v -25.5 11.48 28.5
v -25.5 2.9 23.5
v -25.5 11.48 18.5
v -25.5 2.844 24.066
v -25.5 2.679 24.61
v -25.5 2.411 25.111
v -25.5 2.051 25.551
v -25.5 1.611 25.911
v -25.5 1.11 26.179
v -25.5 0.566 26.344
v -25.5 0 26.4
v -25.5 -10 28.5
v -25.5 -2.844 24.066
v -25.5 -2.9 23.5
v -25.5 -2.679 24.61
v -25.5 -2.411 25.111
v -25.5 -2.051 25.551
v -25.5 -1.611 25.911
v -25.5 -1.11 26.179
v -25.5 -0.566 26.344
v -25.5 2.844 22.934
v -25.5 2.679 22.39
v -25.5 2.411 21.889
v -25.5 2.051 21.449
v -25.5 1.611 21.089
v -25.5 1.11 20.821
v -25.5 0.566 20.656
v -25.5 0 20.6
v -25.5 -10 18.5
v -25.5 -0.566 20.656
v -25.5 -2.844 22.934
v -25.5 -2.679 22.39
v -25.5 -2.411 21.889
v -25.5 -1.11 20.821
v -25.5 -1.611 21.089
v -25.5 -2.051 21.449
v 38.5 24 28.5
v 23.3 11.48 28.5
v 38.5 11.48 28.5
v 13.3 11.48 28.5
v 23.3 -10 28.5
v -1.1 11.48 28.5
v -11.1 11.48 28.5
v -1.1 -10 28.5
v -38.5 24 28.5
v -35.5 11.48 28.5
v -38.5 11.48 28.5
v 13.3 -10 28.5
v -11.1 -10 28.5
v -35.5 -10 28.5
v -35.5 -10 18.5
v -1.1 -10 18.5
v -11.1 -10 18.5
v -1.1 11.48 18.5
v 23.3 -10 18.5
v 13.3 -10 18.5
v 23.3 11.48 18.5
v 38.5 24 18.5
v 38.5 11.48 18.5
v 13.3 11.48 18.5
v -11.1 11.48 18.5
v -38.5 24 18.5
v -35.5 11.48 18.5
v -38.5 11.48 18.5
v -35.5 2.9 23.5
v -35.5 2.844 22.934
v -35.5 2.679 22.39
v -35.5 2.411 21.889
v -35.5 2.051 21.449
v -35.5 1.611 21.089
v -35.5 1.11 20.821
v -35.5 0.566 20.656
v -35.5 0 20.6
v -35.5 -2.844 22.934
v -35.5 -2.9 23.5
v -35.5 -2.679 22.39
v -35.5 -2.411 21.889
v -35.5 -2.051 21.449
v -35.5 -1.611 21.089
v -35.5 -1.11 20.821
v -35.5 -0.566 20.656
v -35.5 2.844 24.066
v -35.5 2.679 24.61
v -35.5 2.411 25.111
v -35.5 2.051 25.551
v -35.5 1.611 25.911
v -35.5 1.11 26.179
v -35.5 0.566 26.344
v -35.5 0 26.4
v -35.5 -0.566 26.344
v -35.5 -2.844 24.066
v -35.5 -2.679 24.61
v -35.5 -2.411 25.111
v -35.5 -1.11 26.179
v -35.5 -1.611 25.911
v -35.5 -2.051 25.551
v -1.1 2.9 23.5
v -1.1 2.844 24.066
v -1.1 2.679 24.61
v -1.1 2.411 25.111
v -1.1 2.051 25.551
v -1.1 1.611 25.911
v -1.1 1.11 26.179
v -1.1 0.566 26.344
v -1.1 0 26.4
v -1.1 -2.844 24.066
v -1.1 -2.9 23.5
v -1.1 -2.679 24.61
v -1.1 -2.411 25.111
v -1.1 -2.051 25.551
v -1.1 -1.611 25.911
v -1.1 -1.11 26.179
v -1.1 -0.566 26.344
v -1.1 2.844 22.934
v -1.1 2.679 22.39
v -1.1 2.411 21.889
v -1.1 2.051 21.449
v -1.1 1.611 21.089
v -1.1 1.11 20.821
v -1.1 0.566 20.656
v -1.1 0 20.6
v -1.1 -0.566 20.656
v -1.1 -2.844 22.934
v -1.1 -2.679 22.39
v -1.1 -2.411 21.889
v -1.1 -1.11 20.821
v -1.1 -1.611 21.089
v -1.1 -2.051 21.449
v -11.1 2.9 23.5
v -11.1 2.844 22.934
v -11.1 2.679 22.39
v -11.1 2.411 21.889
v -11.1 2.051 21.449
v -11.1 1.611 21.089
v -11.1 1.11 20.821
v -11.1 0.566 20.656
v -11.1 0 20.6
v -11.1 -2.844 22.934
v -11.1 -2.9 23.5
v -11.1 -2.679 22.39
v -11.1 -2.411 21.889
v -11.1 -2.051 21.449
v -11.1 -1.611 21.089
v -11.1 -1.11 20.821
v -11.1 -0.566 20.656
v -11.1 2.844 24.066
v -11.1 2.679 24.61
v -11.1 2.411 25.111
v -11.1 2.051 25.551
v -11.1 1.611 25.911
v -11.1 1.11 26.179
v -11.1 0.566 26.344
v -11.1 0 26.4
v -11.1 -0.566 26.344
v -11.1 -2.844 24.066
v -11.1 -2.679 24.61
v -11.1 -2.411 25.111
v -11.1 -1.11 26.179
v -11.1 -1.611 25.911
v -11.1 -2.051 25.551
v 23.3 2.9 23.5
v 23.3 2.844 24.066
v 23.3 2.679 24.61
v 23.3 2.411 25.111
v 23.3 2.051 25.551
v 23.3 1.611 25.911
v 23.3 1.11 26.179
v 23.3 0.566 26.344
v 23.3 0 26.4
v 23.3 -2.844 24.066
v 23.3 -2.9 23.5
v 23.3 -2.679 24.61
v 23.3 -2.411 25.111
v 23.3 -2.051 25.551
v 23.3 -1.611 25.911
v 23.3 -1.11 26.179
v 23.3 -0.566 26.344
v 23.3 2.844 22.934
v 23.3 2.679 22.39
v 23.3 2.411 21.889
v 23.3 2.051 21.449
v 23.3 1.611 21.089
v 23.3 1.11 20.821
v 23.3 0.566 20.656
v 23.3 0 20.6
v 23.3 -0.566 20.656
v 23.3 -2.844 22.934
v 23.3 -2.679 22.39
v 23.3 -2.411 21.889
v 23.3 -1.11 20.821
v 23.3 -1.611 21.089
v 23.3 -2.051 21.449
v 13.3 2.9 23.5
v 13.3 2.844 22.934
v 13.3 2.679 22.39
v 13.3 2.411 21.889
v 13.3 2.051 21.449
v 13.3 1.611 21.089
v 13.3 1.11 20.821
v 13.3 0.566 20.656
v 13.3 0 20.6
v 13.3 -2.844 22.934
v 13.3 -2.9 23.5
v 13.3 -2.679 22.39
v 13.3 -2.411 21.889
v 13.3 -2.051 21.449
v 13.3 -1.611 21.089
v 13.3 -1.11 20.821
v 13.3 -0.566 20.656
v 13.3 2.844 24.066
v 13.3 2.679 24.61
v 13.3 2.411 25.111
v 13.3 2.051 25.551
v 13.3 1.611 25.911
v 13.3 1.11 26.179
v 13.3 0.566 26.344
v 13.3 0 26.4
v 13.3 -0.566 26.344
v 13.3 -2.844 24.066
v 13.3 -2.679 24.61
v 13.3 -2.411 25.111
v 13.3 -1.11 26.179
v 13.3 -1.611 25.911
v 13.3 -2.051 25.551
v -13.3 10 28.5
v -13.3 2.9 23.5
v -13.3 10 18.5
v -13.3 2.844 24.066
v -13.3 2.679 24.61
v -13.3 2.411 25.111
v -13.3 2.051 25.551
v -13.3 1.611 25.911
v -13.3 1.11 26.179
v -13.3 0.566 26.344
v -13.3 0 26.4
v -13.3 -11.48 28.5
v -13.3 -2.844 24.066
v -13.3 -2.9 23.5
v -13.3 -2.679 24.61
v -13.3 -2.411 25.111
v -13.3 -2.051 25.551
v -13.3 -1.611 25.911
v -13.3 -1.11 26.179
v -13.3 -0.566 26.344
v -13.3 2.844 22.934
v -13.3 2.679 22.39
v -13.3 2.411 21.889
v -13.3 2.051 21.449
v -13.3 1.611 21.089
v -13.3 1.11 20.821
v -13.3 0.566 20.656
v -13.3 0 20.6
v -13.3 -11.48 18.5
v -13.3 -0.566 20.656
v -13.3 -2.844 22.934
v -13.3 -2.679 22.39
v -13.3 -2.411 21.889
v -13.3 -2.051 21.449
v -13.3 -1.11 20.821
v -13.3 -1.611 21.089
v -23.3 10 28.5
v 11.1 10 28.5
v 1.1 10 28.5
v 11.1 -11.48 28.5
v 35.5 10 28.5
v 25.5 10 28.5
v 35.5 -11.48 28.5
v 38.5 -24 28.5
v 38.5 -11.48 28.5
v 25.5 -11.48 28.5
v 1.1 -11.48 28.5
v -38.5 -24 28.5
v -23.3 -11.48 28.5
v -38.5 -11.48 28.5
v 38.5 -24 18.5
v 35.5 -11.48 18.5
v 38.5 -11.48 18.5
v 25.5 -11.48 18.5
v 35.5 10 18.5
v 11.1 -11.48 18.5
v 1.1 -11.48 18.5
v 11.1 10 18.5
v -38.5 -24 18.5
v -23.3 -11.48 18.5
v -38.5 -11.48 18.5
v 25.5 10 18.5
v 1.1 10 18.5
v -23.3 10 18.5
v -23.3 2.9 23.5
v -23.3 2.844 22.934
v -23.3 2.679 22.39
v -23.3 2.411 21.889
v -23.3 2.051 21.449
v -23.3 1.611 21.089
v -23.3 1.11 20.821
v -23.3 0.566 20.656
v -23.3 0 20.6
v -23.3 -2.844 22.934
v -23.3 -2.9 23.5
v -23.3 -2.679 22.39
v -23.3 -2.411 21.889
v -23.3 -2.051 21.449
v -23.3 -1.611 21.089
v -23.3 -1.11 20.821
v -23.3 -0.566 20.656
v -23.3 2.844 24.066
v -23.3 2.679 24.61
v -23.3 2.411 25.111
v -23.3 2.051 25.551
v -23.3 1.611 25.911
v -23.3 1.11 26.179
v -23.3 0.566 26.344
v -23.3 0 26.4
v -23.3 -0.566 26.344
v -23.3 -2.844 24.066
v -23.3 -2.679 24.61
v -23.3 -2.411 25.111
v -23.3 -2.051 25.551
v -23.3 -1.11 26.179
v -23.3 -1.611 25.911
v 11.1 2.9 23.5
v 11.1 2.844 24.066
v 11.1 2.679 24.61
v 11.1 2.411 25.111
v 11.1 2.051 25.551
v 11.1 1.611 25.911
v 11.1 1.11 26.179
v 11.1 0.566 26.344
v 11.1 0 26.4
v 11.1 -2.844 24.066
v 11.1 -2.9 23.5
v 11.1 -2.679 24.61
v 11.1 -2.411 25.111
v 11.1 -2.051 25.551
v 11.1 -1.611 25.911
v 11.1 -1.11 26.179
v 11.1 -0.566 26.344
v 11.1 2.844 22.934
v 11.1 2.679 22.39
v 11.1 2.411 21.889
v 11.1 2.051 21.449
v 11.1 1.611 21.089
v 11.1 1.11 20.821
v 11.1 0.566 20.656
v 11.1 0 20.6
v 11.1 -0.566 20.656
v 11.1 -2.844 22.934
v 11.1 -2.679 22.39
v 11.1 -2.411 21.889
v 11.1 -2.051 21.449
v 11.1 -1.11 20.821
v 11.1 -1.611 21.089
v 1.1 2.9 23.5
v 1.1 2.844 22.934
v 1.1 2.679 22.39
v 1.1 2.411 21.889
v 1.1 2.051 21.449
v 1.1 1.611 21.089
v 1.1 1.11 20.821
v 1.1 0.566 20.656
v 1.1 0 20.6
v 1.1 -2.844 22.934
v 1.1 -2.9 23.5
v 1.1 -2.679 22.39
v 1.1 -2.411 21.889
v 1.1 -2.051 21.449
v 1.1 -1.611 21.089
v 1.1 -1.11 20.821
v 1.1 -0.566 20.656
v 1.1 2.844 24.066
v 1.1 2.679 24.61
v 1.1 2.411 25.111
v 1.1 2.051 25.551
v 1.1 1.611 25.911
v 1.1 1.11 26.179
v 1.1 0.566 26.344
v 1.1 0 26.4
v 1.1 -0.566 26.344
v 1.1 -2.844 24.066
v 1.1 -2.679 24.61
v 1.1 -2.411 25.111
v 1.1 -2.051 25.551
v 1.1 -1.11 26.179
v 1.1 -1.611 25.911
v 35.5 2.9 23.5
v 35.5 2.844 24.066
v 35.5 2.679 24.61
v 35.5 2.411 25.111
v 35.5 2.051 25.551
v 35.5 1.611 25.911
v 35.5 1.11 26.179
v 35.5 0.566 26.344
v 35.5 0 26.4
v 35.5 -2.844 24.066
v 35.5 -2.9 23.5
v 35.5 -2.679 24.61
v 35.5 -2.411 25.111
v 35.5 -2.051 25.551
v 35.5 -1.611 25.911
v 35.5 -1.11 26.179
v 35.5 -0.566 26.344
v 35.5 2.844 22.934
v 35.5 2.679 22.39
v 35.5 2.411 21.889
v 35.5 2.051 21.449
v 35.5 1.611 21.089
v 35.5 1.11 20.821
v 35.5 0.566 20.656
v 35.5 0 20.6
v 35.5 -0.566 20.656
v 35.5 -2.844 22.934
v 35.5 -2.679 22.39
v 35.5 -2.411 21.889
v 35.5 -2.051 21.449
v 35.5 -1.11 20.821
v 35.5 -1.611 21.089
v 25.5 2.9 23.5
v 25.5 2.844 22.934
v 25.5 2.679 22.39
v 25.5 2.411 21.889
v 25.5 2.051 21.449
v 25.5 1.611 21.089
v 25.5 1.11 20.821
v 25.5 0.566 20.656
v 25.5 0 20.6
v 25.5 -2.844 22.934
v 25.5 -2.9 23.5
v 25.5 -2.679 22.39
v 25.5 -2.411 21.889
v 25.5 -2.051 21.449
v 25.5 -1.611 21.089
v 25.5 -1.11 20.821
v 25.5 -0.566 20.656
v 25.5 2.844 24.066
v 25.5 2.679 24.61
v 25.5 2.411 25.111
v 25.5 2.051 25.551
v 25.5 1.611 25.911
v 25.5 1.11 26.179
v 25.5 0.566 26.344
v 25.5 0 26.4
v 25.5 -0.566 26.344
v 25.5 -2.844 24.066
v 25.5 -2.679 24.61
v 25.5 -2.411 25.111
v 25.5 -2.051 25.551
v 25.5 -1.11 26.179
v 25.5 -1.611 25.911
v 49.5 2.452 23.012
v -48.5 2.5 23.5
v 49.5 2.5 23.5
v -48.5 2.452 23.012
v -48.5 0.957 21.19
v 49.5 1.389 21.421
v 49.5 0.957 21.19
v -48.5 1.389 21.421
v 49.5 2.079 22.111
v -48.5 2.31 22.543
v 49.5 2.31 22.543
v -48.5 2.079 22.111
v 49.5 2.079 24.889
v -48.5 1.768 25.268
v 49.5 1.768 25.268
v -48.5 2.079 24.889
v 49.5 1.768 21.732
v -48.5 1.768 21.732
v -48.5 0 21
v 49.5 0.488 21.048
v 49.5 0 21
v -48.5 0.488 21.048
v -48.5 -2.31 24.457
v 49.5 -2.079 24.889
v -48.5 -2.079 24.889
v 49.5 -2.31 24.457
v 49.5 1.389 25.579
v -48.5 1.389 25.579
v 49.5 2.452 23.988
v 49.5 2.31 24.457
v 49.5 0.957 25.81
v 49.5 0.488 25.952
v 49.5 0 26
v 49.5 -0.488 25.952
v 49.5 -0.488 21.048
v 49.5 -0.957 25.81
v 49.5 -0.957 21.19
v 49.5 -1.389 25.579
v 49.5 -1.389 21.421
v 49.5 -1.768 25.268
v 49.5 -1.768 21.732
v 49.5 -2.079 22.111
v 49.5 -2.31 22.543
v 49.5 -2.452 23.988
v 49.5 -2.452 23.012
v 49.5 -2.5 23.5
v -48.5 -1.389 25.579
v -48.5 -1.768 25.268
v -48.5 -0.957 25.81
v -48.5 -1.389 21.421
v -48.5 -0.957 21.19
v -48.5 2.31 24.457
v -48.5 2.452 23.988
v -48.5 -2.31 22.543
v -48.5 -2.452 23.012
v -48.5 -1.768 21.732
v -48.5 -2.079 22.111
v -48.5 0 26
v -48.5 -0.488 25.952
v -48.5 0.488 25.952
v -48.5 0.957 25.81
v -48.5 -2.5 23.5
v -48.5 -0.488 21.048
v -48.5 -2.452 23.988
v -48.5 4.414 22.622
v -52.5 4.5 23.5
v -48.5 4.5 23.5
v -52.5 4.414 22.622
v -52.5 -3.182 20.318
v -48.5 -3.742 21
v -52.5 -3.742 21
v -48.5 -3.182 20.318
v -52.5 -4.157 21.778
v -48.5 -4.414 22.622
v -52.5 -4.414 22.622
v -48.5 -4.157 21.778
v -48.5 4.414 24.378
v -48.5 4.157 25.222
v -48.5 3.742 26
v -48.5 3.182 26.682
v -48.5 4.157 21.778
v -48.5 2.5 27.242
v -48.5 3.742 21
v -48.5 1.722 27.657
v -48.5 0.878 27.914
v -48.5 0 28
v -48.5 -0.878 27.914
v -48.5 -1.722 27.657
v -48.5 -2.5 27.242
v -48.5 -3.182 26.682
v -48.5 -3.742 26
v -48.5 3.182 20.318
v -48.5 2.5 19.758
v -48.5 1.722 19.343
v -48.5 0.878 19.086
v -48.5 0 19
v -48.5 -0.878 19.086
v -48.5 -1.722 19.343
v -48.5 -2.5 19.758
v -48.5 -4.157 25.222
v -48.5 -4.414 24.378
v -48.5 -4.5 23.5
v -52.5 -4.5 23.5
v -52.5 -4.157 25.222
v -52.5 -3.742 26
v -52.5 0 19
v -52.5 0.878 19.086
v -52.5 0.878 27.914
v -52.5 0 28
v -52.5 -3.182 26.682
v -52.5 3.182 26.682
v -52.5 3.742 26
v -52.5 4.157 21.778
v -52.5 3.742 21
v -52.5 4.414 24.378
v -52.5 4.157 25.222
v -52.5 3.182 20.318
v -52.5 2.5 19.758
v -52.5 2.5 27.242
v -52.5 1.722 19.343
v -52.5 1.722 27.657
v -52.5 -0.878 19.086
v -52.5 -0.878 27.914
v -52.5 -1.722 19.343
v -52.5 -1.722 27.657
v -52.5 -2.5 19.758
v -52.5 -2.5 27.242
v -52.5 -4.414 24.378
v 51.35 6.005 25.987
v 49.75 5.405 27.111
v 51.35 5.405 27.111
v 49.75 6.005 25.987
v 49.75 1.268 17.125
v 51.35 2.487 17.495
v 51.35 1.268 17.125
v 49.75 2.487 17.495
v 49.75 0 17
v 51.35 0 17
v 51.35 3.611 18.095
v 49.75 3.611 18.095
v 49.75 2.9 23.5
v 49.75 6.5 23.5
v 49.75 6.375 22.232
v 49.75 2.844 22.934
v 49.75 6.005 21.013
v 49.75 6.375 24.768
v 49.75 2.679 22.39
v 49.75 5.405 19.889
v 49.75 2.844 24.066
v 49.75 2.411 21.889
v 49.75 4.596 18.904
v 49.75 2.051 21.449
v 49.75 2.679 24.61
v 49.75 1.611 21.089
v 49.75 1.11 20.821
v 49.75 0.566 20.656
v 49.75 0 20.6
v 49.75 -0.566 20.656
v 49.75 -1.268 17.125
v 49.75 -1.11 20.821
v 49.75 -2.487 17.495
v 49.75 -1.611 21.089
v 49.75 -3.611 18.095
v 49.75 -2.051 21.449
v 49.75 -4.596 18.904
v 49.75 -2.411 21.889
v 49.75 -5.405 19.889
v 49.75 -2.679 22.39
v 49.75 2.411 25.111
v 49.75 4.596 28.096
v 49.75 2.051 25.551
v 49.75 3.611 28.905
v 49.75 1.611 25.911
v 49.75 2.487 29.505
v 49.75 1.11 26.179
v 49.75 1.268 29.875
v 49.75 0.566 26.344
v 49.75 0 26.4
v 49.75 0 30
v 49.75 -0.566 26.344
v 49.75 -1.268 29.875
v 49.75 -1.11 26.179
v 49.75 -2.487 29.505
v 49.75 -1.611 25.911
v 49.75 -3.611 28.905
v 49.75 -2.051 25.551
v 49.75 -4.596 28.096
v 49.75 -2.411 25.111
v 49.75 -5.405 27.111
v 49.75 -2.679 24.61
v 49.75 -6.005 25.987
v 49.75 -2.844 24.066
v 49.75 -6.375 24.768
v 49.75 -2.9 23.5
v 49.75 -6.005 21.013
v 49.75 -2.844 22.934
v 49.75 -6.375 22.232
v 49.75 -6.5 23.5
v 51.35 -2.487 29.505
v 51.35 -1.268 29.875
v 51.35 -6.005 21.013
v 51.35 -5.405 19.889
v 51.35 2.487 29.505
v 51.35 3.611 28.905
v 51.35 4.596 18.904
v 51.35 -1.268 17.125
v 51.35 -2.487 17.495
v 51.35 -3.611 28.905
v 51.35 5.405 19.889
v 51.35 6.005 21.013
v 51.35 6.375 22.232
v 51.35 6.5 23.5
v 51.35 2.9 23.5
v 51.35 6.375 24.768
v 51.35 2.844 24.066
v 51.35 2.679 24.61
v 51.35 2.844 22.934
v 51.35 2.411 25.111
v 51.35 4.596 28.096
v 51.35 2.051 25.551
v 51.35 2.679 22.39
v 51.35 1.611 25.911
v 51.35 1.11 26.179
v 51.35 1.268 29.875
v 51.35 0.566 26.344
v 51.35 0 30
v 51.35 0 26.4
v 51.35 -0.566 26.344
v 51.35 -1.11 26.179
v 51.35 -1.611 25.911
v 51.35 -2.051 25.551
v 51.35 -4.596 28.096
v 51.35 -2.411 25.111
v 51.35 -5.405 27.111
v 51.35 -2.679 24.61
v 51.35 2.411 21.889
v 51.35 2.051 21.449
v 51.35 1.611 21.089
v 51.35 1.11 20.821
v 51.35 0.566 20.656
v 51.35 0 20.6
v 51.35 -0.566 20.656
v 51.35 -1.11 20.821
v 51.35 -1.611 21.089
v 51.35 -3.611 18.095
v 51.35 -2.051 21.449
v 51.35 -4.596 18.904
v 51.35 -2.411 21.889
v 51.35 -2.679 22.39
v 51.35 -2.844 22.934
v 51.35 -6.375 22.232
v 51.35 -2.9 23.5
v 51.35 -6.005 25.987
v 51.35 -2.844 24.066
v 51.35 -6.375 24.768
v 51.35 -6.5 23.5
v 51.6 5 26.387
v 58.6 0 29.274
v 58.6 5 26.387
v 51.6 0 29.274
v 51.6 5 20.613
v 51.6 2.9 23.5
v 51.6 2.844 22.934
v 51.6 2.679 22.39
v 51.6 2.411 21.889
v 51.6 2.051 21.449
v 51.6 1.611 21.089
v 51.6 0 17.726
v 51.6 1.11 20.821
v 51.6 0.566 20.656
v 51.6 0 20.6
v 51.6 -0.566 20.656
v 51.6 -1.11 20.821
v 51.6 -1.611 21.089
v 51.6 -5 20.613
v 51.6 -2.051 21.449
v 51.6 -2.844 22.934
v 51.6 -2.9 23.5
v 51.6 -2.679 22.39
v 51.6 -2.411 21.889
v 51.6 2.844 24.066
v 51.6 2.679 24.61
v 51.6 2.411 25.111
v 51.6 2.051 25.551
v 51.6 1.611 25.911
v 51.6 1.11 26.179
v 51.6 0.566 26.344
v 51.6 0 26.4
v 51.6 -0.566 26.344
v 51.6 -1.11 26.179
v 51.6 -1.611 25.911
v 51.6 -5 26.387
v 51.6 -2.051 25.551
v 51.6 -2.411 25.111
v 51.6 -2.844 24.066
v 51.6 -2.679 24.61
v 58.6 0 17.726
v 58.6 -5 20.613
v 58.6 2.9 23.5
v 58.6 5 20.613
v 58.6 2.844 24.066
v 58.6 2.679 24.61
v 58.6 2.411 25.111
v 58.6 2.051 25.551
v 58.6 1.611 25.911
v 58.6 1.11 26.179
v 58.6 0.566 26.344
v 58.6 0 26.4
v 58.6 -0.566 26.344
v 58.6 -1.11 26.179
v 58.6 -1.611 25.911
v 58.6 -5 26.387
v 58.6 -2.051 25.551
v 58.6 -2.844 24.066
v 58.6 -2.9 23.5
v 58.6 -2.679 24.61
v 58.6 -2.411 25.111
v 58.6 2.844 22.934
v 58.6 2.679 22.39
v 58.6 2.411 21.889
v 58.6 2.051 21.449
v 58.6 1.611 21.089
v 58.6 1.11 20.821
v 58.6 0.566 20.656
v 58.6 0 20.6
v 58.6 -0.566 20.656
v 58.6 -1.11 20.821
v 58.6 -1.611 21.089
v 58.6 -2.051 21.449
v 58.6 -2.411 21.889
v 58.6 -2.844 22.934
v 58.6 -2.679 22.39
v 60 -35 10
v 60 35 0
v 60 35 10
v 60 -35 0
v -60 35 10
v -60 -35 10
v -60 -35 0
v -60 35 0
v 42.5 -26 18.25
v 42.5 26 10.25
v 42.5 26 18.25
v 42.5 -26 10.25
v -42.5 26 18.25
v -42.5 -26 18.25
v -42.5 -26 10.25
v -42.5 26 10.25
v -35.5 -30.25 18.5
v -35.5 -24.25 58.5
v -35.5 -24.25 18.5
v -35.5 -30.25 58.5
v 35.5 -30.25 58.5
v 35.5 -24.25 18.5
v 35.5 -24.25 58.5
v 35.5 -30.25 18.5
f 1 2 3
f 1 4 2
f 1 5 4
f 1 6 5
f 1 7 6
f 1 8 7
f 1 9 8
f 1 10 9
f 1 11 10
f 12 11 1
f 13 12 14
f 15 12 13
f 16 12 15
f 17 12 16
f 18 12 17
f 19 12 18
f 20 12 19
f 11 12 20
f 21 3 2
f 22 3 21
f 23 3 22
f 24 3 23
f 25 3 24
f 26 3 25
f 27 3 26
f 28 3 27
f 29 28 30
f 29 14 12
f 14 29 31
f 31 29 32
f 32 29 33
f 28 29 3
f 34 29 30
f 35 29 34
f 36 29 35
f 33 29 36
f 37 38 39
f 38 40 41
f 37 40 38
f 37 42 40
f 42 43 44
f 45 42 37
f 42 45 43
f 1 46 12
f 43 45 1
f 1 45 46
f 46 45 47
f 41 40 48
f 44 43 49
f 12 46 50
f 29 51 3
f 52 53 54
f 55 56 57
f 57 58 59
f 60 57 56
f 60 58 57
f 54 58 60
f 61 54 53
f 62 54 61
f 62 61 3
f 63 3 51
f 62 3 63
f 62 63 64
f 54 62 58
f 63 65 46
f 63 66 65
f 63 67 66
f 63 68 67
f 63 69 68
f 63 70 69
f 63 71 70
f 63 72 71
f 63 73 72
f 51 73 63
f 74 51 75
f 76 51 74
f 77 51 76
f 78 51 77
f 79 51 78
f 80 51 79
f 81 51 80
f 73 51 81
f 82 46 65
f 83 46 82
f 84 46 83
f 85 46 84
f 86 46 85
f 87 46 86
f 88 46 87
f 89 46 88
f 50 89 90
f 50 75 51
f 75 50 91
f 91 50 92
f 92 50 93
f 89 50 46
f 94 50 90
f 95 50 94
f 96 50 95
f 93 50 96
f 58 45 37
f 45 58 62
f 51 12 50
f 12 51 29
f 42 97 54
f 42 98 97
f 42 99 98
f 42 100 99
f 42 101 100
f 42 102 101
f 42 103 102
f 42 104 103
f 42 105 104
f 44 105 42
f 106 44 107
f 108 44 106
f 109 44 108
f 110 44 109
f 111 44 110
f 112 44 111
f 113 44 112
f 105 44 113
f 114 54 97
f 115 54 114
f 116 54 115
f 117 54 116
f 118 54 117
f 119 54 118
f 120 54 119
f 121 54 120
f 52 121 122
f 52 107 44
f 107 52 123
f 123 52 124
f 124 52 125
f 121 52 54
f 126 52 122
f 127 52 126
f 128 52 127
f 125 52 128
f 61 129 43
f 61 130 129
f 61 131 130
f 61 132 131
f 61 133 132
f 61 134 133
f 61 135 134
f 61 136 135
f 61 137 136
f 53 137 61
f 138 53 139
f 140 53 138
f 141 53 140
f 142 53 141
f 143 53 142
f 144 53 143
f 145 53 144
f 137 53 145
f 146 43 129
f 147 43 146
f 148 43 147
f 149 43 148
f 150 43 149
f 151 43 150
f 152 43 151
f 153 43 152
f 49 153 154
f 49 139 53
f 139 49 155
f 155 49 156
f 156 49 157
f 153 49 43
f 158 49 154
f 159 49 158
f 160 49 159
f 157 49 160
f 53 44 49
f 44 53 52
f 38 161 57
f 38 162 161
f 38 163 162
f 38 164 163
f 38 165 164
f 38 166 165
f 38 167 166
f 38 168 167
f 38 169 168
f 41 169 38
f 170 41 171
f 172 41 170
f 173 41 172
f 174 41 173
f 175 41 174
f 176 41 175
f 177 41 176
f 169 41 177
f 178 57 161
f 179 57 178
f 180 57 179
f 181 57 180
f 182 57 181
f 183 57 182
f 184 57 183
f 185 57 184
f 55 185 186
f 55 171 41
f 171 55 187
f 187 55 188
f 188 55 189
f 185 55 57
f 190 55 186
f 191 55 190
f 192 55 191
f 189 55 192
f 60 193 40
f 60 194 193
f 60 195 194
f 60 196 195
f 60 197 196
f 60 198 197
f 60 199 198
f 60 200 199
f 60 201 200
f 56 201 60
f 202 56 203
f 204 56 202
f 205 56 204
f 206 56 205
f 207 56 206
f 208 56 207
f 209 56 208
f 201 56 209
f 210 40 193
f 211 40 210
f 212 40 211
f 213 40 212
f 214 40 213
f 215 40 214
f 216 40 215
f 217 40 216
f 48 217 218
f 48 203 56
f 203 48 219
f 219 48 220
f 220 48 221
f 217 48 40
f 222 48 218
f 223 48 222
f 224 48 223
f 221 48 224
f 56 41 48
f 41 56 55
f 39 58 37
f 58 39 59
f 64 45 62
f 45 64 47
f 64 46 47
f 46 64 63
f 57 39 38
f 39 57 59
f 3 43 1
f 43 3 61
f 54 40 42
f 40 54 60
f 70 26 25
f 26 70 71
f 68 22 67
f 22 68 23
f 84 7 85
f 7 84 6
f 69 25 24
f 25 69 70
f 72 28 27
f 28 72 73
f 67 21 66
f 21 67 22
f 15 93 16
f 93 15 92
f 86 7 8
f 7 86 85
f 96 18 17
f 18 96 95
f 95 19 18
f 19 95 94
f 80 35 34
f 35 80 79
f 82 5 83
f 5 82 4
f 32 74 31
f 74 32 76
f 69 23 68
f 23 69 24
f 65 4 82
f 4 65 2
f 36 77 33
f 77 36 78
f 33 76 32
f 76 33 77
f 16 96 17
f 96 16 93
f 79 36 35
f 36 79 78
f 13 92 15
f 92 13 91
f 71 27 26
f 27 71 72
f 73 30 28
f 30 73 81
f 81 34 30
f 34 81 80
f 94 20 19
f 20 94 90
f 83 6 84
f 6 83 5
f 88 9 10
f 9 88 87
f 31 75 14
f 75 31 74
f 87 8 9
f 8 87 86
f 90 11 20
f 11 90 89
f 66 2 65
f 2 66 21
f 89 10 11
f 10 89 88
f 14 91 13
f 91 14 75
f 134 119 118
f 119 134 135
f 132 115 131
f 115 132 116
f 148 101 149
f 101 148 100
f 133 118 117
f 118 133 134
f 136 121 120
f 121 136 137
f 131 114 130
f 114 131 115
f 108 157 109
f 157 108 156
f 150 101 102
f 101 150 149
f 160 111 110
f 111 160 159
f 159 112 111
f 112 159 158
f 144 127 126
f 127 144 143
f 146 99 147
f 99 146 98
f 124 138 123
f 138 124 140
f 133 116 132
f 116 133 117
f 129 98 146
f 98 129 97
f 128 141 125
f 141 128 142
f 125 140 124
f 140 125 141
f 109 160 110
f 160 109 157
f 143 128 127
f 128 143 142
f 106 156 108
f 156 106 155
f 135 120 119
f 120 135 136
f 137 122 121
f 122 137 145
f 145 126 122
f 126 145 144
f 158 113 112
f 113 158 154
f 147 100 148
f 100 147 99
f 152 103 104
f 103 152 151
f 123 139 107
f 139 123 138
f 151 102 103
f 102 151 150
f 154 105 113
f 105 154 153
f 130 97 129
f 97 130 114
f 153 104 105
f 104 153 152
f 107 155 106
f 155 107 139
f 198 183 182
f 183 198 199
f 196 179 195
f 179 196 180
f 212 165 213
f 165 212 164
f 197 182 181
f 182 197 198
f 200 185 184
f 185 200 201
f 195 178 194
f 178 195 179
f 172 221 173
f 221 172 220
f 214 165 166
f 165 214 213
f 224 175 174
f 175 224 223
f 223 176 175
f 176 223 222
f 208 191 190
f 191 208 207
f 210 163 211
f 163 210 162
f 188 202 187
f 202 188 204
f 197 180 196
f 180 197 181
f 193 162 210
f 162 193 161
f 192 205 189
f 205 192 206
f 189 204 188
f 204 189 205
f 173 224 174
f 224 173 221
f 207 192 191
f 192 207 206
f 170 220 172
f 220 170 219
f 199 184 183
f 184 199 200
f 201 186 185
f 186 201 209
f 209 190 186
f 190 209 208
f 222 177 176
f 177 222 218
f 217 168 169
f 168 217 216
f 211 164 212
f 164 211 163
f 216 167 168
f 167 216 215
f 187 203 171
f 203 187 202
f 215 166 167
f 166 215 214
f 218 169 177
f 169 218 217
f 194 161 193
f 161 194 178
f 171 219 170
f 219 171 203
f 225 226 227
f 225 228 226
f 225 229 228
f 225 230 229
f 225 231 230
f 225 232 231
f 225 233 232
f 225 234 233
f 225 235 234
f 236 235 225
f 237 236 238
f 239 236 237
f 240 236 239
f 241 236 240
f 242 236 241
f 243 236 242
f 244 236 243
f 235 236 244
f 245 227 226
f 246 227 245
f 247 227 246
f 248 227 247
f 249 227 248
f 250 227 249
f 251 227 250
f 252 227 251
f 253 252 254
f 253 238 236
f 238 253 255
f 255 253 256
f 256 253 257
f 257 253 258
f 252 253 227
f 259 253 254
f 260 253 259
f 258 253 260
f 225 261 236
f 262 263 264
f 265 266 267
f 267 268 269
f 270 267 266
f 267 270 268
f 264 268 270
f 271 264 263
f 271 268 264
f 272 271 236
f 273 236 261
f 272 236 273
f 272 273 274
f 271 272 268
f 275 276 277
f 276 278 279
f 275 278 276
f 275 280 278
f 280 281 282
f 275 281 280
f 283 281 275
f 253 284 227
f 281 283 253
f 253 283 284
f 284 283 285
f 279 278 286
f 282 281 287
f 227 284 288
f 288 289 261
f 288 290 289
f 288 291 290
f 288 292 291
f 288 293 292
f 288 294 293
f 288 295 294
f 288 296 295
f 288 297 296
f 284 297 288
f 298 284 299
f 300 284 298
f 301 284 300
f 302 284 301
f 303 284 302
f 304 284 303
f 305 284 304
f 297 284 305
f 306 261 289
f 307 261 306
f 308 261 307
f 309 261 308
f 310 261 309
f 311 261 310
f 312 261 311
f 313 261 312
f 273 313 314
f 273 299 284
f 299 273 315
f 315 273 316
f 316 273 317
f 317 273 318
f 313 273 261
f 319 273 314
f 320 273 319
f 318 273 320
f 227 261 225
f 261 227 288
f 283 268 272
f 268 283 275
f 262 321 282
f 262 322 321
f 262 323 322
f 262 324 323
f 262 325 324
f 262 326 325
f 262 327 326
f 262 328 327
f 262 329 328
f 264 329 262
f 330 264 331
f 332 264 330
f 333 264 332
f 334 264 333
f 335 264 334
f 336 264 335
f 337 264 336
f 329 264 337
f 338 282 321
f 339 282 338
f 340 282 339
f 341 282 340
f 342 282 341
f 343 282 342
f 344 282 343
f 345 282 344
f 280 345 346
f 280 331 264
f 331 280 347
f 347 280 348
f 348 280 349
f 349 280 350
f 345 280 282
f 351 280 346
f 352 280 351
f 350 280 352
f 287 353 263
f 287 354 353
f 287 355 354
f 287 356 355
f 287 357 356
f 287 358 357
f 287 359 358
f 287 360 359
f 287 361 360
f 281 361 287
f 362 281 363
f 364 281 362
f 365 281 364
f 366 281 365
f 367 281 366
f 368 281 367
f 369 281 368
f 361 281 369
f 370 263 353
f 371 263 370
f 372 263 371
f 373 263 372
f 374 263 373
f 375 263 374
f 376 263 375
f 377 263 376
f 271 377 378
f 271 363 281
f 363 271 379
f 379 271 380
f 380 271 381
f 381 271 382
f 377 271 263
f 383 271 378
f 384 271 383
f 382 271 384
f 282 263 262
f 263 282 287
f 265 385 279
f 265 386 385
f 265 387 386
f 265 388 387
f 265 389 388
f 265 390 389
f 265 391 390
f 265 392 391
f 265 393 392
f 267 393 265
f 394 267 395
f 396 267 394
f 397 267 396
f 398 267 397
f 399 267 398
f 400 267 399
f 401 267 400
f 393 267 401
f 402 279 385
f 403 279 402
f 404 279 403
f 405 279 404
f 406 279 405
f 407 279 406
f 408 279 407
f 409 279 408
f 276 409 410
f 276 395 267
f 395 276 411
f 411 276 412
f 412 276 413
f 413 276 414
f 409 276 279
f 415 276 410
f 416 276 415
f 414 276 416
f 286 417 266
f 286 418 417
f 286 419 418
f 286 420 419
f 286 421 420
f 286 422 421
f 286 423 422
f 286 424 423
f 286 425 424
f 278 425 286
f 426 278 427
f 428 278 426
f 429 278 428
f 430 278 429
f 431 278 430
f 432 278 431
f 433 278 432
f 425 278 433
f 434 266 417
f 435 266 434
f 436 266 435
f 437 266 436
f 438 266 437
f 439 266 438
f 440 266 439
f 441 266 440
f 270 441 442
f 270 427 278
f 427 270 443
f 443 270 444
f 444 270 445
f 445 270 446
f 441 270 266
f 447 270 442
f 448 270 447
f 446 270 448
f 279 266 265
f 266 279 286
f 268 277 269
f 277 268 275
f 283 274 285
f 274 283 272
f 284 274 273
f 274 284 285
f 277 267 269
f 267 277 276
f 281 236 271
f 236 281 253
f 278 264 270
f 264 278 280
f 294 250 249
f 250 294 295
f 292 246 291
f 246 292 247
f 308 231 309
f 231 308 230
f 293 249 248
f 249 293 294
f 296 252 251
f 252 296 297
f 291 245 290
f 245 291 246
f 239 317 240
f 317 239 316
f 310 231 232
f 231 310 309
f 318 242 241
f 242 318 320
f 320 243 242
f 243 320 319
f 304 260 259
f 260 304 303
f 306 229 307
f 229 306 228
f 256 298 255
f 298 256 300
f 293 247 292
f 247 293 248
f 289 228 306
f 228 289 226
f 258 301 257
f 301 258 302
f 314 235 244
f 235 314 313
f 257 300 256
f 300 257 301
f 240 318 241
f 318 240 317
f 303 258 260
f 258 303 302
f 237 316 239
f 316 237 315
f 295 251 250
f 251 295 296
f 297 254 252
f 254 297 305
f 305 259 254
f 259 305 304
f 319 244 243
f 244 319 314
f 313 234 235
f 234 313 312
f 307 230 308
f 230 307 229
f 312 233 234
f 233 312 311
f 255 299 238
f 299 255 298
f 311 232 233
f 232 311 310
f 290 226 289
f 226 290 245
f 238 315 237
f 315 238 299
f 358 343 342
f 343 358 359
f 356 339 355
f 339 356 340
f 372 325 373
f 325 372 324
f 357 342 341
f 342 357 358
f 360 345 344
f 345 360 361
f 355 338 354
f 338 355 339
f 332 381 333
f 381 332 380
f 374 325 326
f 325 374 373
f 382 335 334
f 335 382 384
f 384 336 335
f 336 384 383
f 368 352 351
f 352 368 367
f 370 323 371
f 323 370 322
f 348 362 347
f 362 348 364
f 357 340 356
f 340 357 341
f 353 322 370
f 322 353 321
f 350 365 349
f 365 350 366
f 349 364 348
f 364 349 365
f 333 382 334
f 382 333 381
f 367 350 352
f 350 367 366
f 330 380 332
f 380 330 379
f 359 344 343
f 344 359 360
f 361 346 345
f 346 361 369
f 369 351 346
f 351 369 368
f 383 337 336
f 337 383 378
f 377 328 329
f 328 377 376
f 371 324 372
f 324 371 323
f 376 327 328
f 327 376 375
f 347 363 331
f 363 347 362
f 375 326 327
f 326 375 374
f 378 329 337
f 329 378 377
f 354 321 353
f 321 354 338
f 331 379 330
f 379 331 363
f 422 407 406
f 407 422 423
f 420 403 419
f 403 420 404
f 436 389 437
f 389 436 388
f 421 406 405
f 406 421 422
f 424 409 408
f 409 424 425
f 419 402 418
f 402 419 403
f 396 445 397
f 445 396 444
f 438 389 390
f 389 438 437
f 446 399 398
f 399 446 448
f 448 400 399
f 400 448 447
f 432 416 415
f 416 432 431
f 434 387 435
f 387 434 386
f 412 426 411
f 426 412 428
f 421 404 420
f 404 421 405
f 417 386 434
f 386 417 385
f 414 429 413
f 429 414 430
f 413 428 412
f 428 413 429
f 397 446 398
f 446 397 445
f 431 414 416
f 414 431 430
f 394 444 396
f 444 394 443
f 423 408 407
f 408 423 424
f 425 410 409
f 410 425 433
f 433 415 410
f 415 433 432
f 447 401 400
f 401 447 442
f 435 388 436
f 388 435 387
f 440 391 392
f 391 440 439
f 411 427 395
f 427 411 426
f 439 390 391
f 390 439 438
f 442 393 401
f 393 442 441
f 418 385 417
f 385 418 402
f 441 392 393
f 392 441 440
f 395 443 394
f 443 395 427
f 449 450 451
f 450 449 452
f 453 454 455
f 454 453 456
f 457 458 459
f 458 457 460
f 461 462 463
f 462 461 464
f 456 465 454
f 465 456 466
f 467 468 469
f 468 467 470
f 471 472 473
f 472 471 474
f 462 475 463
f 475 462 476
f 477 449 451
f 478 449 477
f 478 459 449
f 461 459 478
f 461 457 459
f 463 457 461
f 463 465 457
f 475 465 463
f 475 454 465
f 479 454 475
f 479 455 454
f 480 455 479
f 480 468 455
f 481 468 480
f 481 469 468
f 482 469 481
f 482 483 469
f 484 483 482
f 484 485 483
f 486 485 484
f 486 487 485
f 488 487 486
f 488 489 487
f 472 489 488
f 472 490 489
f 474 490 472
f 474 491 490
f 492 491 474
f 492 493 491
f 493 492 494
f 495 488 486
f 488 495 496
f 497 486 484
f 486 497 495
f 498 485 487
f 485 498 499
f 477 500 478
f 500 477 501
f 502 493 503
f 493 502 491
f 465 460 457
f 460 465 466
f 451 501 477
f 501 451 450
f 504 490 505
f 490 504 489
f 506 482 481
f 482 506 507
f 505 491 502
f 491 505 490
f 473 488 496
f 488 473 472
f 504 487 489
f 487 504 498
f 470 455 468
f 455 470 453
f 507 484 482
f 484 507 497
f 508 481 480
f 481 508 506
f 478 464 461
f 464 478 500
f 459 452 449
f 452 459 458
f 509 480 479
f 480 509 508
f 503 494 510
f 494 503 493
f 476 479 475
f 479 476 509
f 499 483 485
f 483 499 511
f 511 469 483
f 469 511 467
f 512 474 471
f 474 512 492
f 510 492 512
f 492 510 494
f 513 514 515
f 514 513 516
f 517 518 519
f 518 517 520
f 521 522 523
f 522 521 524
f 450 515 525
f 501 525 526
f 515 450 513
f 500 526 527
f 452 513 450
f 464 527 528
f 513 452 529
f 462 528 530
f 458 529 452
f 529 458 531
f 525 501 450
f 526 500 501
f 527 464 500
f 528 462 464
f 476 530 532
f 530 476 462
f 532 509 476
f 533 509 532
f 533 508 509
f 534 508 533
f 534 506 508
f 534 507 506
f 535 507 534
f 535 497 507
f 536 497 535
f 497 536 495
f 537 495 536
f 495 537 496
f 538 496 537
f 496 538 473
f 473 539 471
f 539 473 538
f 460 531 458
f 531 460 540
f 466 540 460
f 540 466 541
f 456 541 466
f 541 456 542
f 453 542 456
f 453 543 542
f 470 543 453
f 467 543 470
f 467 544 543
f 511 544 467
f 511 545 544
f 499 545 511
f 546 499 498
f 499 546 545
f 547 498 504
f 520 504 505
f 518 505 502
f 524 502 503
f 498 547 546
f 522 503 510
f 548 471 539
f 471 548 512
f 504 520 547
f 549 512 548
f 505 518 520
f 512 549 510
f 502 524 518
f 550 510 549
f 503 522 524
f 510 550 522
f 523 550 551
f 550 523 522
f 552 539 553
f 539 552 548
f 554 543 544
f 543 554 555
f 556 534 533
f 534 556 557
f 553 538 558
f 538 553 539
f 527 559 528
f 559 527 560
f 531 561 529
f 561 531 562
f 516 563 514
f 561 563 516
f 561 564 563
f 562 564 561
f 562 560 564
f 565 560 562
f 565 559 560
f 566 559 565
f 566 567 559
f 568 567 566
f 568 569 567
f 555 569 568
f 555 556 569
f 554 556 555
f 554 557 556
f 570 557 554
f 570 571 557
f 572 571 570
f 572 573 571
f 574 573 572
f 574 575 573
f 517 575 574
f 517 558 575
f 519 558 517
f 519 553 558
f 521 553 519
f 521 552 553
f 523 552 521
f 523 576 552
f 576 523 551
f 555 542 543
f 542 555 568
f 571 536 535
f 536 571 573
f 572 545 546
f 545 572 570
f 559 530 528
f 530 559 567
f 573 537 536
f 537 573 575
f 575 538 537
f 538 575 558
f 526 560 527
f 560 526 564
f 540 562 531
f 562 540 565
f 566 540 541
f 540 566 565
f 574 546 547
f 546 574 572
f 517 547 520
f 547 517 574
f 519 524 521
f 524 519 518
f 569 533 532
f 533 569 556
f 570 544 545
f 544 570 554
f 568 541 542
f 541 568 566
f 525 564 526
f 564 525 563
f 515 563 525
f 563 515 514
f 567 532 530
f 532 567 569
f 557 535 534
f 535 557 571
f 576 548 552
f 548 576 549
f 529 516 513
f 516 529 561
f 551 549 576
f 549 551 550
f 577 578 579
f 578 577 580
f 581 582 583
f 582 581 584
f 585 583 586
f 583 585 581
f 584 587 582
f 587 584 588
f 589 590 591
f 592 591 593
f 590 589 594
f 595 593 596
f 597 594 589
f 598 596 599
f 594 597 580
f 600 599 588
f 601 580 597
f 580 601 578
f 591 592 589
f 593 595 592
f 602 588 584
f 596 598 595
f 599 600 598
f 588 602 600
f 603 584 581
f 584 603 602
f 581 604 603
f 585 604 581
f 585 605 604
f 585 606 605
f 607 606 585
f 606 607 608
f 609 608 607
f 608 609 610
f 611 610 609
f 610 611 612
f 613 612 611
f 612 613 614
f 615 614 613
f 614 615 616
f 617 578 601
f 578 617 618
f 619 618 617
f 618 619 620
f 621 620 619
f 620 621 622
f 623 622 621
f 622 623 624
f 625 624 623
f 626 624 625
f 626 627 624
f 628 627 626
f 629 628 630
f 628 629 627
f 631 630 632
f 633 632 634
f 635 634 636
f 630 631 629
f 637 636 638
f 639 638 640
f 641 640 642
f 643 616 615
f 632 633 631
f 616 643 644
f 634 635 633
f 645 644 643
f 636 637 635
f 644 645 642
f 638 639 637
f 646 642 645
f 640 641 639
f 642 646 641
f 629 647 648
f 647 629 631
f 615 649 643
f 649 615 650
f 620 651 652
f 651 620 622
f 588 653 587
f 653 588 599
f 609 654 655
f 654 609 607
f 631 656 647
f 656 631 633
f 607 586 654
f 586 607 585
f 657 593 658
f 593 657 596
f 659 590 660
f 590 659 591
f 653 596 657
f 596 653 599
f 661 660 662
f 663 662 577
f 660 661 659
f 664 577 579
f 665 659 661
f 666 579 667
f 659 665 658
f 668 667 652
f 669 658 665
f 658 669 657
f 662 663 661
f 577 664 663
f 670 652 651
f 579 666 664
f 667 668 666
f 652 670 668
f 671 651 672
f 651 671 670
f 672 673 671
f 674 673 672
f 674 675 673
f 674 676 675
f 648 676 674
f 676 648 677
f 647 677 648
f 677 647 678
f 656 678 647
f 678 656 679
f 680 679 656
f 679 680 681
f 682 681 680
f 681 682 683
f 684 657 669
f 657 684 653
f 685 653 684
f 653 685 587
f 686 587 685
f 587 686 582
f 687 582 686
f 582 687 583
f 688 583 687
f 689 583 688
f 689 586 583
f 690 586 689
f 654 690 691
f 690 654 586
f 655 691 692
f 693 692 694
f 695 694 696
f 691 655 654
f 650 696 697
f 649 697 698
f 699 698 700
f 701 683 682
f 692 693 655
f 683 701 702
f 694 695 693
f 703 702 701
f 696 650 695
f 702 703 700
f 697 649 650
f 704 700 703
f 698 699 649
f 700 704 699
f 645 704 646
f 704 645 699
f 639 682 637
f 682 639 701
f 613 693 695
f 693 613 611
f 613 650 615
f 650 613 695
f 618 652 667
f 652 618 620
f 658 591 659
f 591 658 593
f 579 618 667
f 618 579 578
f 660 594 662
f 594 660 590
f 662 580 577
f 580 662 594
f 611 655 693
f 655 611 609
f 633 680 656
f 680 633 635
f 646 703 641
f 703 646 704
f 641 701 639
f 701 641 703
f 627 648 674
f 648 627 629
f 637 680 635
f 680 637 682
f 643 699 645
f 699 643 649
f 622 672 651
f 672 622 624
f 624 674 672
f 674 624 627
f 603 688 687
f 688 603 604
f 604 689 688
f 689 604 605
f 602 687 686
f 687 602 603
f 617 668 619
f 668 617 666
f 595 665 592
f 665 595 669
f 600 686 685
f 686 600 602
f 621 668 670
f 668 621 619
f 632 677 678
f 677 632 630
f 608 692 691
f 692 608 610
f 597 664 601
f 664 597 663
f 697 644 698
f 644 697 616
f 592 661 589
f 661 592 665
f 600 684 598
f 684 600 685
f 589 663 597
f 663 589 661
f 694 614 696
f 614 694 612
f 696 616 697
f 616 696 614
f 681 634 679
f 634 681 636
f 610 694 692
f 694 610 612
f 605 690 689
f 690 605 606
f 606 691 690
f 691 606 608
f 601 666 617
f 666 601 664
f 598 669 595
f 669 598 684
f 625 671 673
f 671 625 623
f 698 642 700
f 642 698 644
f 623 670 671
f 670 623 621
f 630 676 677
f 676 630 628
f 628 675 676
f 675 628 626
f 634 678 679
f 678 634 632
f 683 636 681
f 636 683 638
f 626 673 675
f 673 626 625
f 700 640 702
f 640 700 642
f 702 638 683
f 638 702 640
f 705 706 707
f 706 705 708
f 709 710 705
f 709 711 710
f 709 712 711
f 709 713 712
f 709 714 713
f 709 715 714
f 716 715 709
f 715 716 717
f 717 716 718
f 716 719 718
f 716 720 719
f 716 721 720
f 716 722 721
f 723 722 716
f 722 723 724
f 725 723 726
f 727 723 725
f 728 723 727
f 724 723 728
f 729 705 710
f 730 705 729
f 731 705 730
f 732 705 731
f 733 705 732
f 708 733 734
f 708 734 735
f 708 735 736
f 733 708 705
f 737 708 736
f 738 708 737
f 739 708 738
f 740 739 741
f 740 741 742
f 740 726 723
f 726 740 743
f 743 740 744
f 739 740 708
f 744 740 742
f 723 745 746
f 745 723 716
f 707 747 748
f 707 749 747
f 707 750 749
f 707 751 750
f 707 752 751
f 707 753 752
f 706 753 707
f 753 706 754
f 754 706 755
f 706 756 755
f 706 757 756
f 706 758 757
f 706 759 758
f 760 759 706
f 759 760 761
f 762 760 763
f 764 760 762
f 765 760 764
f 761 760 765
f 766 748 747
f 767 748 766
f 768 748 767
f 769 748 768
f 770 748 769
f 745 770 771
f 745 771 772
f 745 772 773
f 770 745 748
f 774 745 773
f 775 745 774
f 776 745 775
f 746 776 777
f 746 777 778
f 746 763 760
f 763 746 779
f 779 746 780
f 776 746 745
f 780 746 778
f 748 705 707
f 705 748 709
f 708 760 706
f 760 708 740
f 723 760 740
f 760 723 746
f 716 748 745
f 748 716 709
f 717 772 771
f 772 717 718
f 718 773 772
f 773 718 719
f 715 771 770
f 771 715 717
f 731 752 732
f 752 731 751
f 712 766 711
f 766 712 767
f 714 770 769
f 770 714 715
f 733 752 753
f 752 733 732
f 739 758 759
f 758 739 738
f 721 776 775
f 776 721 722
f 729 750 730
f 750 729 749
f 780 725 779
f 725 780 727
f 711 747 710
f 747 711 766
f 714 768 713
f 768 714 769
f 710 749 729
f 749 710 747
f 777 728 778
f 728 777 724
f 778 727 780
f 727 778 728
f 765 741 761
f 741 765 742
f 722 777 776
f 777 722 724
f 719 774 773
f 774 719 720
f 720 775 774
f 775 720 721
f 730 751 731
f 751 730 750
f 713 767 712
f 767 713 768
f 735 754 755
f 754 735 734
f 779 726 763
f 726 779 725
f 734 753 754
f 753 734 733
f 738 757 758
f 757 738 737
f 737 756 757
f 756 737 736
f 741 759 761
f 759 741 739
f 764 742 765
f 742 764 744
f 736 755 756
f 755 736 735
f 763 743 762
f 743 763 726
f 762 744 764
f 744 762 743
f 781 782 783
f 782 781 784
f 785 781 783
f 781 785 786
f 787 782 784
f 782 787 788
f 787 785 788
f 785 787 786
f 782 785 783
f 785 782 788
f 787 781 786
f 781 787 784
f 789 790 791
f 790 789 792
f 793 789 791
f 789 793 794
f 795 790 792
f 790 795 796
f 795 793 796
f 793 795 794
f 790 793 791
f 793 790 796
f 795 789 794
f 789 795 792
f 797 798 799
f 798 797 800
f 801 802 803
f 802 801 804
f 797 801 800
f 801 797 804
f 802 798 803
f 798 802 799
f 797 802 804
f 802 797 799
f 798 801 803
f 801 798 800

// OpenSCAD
$fn = 32;

// ------------------------------------------------------------------------
// Comb hinge with flap: leaf 77 x 24 mm, pin d5, flap 40 mm
// Every part is its own module, assembly() places every instance.
// ------------------------------------------------------------------------

// --- part 1 ---
module hinge_bed() {
  difference() {
    translate([-60, -35, 0]) cube([120, 70, 10]);
  }
}

// --- part 2 ---
module hinge_riser() {
  difference() {
    translate([-42.5, -26, 0]) cube([85, 52, 8]);
  }
}

// --- part 3 ---
module hinge_leaf_a() {
  difference() {
    union() {
      translate([-35.5, -10, -5]) cube([10, 34, 10]);
      translate([-11.1, -10, -5]) cube([10, 34, 10]);
      translate([13.3, -10, -5]) cube([10, 34, 10]);
      translate([-38.5, 11.48, -5]) cube([77, 12.52, 10]);
    }
    translate([-30.5, 0, 0]) rotate([0, 90, 0]) cylinder(h = 12, d = 5.8, center = true);
    translate([-6.1, 0, 0]) rotate([0, 90, 0]) cylinder(h = 12, d = 5.8, center = true);
    translate([18.3, 0, 0]) rotate([0, 90, 0]) cylinder(h = 12, d = 5.8, center = true);
  }
}

// --- part 4 ---
module hinge_leaf_b() {
  difference() {
    union() {
      translate([-23.3, -24, -5]) cube([10, 34, 10]);
      translate([1.1, -24, -5]) cube([10, 34, 10]);
      translate([25.5, -24, -5]) cube([10, 34, 10]);
      translate([-38.5, -24, -5]) cube([77, 12.52, 10]);
    }
    translate([-18.3, 0, 0]) rotate([0, 90, 0]) cylinder(h = 12, d = 5.8, center = true);
    translate([6.1, 0, 0]) rotate([0, 90, 0]) cylinder(h = 12, d = 5.8, center = true);
    translate([30.5, 0, 0]) rotate([0, 90, 0]) cylinder(h = 12, d = 5.8, center = true);
  }
}

// --- part 5 ---
module hinge_flap() {
  difference() {
    translate([-35.5, -20, 0]) cube([71, 40, 6]);
  }
}

// --- part 6 ---
module hinge_pin() {
  rotate([0, 90, 0]) cylinder(h = 99, d = 5, center = true);
  translate([-52.5, 0, 0]) rotate([0, 90, 0]) cylinder(h = 4, d = 9);
}

// --- part 7 ---
module pin_washer() {
  difference() {
      translate([0, 0, 0]) cylinder(h = 1.6, d = 13);
      translate([0, 0, -1]) cylinder(h = 3.6, d = 5.8);
    }
}

// --- part 8 ---
module pin_nut() {
  difference() {
    linear_extrude(height = 7) polygon(points = [[5.774, 0], [2.887, 5], [-2.887, 5], [-5.774, 0], [-2.887, -5], [2.887, -5]]);
    translate([0, 0, -1]) cylinder(h = 9, d = 5.8);
  }
}

// --- assembly ---
module assembly() {
  color([0.80, 0.24, 0.20]) translate([0, 0, 0]) rotate([0, 0, 0]) hinge_bed();
  color([0.20, 0.45, 0.75]) translate([0, 0, 10.25]) rotate([0, 0, 0]) hinge_riser();
  color([0.25, 0.62, 0.32]) translate([0, 0, 23.5]) rotate([0, 0, 0]) hinge_leaf_a();
  color([0.92, 0.70, 0.18]) translate([0, 0, 23.5]) rotate([0, 0, 0]) hinge_leaf_b();
  color([0.58, 0.35, 0.70]) translate([0, -24.25, 38.5]) rotate([90, 0, 0]) hinge_flap();
  color([0.16, 0.66, 0.66]) translate([0, 0, 23.5]) rotate([0, 0, 0]) hinge_pin();
  color([0.85, 0.48, 0.18]) translate([49.75, 0, 23.5]) rotate([0, 90, 0]) pin_washer();
  color([0.55, 0.60, 0.65]) translate([51.6, 0, 23.5]) rotate([0, 90, 0]) pin_nut();
}

assembly();
